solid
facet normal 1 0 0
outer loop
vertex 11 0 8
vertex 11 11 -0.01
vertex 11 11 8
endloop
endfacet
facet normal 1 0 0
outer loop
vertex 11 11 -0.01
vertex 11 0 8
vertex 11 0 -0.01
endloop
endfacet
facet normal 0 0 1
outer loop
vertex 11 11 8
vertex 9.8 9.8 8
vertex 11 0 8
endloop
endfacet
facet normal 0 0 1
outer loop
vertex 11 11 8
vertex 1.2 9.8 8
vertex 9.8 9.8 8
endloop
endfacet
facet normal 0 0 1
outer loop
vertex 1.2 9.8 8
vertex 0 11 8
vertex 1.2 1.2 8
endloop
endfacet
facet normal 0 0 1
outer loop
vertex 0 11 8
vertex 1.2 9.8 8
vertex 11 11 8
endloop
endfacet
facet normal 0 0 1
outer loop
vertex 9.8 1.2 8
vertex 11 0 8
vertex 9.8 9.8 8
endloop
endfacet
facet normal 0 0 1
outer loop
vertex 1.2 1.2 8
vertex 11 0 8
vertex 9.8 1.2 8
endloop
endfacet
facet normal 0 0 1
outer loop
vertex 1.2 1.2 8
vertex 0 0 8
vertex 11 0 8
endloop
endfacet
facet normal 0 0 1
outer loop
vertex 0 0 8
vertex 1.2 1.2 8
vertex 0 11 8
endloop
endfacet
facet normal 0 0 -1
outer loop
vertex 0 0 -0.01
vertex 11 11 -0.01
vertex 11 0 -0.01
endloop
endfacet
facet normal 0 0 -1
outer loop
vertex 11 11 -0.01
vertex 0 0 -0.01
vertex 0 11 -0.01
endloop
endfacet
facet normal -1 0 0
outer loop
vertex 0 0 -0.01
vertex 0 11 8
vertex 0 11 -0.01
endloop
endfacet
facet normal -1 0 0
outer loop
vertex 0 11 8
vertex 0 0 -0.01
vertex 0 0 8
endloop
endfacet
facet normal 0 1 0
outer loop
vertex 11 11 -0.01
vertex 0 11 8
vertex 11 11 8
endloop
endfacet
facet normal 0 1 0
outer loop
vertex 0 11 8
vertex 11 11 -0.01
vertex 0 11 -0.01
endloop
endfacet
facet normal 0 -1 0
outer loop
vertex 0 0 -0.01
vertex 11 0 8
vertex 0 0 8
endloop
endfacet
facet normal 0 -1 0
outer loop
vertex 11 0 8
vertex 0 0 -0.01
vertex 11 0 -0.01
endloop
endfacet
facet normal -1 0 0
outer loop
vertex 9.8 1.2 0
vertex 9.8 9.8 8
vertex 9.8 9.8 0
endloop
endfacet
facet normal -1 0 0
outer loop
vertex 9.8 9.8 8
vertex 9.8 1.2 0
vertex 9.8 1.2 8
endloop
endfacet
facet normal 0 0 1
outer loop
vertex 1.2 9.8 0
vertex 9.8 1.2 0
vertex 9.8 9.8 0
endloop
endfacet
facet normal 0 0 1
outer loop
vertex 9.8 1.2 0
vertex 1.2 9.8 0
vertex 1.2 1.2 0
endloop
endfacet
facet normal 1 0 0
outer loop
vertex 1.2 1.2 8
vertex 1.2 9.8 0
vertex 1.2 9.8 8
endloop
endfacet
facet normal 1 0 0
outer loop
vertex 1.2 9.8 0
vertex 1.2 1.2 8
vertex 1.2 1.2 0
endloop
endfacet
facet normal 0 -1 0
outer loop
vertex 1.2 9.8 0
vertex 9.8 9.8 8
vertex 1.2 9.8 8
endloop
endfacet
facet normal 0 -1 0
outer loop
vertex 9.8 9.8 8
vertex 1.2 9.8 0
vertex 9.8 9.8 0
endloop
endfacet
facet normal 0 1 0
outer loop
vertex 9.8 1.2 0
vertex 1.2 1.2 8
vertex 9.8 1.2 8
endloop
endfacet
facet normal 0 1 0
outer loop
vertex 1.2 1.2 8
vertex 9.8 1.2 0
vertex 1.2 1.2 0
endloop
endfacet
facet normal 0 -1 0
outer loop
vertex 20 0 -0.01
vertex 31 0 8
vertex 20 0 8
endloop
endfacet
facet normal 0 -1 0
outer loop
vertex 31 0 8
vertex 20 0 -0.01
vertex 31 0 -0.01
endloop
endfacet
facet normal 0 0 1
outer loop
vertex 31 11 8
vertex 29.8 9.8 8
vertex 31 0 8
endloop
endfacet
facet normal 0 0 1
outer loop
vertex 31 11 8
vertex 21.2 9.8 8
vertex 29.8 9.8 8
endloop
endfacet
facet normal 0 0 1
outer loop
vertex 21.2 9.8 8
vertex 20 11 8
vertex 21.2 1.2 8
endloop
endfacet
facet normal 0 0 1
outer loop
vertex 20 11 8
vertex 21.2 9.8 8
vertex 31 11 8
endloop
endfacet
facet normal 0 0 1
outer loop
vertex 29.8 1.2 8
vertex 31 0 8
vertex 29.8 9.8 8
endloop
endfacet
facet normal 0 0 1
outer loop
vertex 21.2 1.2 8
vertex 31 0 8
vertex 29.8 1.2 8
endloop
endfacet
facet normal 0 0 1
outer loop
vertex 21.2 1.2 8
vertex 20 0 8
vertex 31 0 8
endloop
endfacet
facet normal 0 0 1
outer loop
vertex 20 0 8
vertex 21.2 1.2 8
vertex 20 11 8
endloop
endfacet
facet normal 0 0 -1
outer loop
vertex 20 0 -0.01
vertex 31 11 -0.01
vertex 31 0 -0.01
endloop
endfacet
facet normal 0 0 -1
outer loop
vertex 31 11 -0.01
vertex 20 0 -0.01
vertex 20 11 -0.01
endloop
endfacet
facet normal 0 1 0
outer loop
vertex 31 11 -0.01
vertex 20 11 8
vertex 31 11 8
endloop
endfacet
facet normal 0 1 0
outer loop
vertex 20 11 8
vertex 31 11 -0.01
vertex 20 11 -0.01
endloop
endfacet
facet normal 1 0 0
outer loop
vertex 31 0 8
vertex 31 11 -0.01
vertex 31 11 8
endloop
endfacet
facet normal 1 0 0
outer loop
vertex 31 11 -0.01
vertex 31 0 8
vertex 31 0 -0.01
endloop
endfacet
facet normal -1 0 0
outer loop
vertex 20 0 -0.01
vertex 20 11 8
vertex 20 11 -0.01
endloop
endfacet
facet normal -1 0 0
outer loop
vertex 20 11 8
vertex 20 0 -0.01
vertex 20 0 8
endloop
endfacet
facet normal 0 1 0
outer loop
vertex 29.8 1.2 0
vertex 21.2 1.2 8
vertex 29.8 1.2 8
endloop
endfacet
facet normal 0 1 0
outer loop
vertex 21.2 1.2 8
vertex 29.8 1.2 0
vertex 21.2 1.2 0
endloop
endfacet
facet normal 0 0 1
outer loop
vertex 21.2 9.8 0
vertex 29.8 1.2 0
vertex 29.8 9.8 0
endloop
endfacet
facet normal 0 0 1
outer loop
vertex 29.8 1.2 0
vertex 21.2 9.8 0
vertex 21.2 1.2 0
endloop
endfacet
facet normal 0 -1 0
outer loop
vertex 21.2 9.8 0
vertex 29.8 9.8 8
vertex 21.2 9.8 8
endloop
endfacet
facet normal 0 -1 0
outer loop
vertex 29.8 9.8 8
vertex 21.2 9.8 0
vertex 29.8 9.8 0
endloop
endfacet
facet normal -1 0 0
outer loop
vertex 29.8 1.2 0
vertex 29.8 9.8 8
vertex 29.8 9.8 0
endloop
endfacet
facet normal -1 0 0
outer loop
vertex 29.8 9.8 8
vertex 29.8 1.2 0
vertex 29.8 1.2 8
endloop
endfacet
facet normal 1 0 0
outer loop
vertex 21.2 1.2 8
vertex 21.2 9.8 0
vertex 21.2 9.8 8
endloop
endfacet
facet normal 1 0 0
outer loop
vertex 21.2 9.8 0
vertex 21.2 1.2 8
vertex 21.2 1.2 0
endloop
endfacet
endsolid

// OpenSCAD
// file: ../../Base/Boxes.scad
// Fischertechnik Box Foundation
// Pre-designed Boxes

use <Constants.scad>

include <PlacementOptions.scad>

box190Width = 190;
box190Depth = 130;
box130Width = 130;
box130Depth = 95;
boxUsageHeight = 33.9;
boxWallThickness = 2.4;
boxBaseThickness = 1.0;

// getBoxWallThickness()
// Gets the wall thickness of a Fischertechnik Box

function getBoxWallThickness() = boxWallThickness;

// Gets the usable height of a fischertechnik box
function getBoxUsageHeight() = boxUsageHeight;

// Gets the thickness of the Fischertechnik box base.
function getBoxBaseThickness() = boxBaseThickness;

// Gets the usable inner space of a Box 190 as an x/y-list
function getBox190Space() = [
    box190Width - 2*getBoxWallThickness(), 
    box190Depth - 2*getBoxWallThickness() ];

// Imports the Fischertechnik empty box 130x190 mm and places it at position 0,0
// 190x130 are the outer sizes, the inner space is slightly smaller. Use getBox190Space() to get the inner sizes.
// This module needs the STL file "Fischertechnik Box 130x190.stl" in the library path.
// The box is positioned that the usable inner space is at the 0,0,0 position. The

module Box190() {
    translate([-getBoxWallThickness(),-getBoxWallThickness(),-getBoxBaseThickness()])
        import("Fischertechnik Box 130x190.stl", convexity=3);
}

// Gets the usable inner space of a Box 130 as an x/y-list
function getBox130Space() = [
    box130Width - 2*getBoxWallThickness(), 
    box130Depth - 2*getBoxWallThickness() ];

// Imports the Fischertechnik empty box 95x130 mm and places it at position 0,0
// 190x130 are the outer sizes, the inner space is slightly smaller. Use getBox190Space() to get the inner sizes.
// This module needs the STL file "Fischertechnik Box 95x130.stl" in the library path.
// The box is positioned that the usable inner space is at the 0,0,0 position. The

module Box130() {
    translate([-getBoxWallThickness(),-getBoxWallThickness(),-getBoxBaseThickness()])
        import("Fischertechnik Box 95x130.stl", convexity=3);
}

// Creates a web at the specified box walls
// corner 0 = LowerLeft, 1 = UpperLeft, 2 = UpperRight, 3 = LowerRight
// side 0 = LeftOfCorner, 1 = RightOfCorner
// distance = Distance in mm from the corner
// box = inner width and depth of the box (default: Box 190)
// webWidth = length of the web (default is 3 mms)
// webThickness = thickness of the web (default is 1 mm)

module BoxWeb(corner, side, distance, box=getBox190Space(), webWidth=3, webThickness=1.0) {
    sink = getBoxWallThickness()/2;

    width = (corner % 2 == 0) ? 
            (side == LeftOfCorner ? webWidth : webThickness) :
            (side == LeftOfCorner ? webThickness : webWidth);

    depth = (corner % 2 == 0) ? 
            (side == RightOfCorner ? webWidth : webThickness) :
            (side == RightOfCorner ? webThickness : webWidth);
    
    xDiff = corner == LowerLeft ? 
                (side == LeftOfCorner ? -sink : distance) :
            (corner == UpperLeft ?                
                (side == LeftOfCorner ? distance : -sink) :
            (corner == UpperRight ?
                (side == LeftOfCorner ? box.x-webWidth+sink : box.x-distance-webThickness) :
                (side == LeftOfCorner ? box.x-distance-webThickness: box.x-webWidth+sink)));

    yDiff = corner == LowerLeft ? 
                (side == RightOfCorner ? -sink : distance) :
            (corner == UpperLeft ?
                (side == RightOfCorner ? box.y-distance : box.y-webWidth+sink) :
            (corner == UpperRight ?
                (side == RightOfCorner ? box.y-webWidth+sink : box.y-distance) :
                (side == RightOfCorner ? distance : -sink)));
    
    translate([xDiff, yDiff, -getExcess()])
        cube([width, depth, boxUsageHeight + 2*getExcess()]);
}
// file: ../../Base/Rotation.scad
// Fischertechnik Box Foundation
// Geometry Helpers Rotation

include <PlacementOptions.scad>

// getRotatedSpace(space, rotation=NoRotation)
// Rotates the space dependent on the specified rotation

function getRotatedSpace(space, rotation=NoRotation) = [
    (rotation == Rotate90 || rotation == Rotate270) ? space.y : space.x,
    (rotation == Rotate90 || rotation == Rotate270) ? space.x : space.y
];

// Rotates the given space around the fixed left lower corner
// space = the space the children needs as width/depth list [width,depth]
// rotation = 0 Rotate0 degrees, 1 Rotate90 degrees, 2 Rotate180 degrees, 3 Rotate270 degrees (equivalent to -90)

module RotateFix(space, rotation=Rotate0) {
    dy = (rotation == Rotate0 || rotation == Rotate270) ? 0 :
        (rotation == Rotate90) ? space.x :
        space.y;
    dx = (rotation < Rotate180) ? 0 :
        (rotation == Rotate180) ? space.x :
        space.y;
    
    translate([dx, dy, 0])
        rotate([0, 0, rotations[rotation]])
            children();
}
// file: ../../Base/Alignment.scad
// Fischertechnik Box Foundation
// Geometry Helpers Alignment

include <PlacementOptions.scad>

// getAlignedX(elementWidth, spaceWidth, align=AlignRight, offset=0)
// Gets the aligned X offset of an element with the given
// width in the given space.
// elementWidth = The width of the element to positon
// spaceWidth = The space where the element should be aligned
// align = 0 AlignLeft, 1 AlignCenter, 2 AlignRight
// offset = an optional offset from the aligned position. When
// aligned left or centered, then positive values are in X direction.
// When aligned right then positive values are in negative X direction.

function getAlignedX(elementWidth, spaceWidth, align=AlignRight, offset=0) =
    (align == AlignLeft) ?
        offset :
        ((align == AlignCenter) ?
        (spaceWidth - elementWidth)/2 + offset :
        spaceWidth - offset - elementWidth);

// getAlignedY(elementDepth, spaceDepth, align=AlignTop, offset=0)
// Gets the aligned Y offset of an element with the given
// depth in the given space.
// elementDepth = The depth of the element to positon
// spaceDepth = The space where the element should be aligned
// align = 0 AlignBottom, 1 AlignCenter, 2 AlignTop
// offset = an optional offset from the aligned position. When
// aligned bottom or centered, then positive values are in Y direction.
// When aligned top then positive values are in negative Y direction.

function getAlignedY(elementDepth, spaceDepth, align=AlignTop, offset=0) =
    (align == AlignBottom) ?
        offset :
        ((align == AlignCenter) ?
        (spaceDepth - elementDepth)/2 + offset :
        spaceDepth - offset - elementDepth);
// file: ../../Base/Constants.scad
// Fischertechnik Box Foundation
// Constants

// Constant values necessary for multiple elements

// Base constants
dividerThickness = 1.2;
excess = 0.01;
fragments = 90;
tolerance = 0.8;

// Gets the thickness of a divider 
function getDividerThickness() = dividerThickness;

// Gets the excess that is used to merge walls into each other
function getExcess() = excess;

// Gets amount of fragments of a cylinder
function getFragments() = fragments;

// Gets the inner tolerance of a frame to each side
function getTolerance() = tolerance;


// Fischertechnik specific constants
axisDiameter = 4;
axisBottomDiameter = axisDiameter + 1;
standardEdgeDistance = 2.5;
standardWebDistance = 11.5;
standardCornerLength = 15;
tubeWallFactor = 1.6;

// Gets axis diameter
function getAxisDiameter() = axisDiameter;

// Gets axis bottom diameter for thicker part at the bottom
function getAxisBottomDiameter() = axisBottomDiameter;

// gets the standard distance to the wall of the box for dockable frames with webs
function getStandardEdgeDistance() = standardEdgeDistance;

// gets the standard distance of each web to the corner of the dockable frame
function getStandardWebDistance() = standardWebDistance;

// gets the standard length of the corner walls of a dockable frame
function getStandardCornerLength() = standardCornerLength;

// gets the wall thickness of a tube.
function getTubeWallThickness() = tubeWallFactor * getDividerThickness();
// file: ../../Base/PlacementOptions.scad
// Fischertechnik Box Foundation
// Placement Options

// Alignment
NoAlign = 0;
AlignLeft = 1;
AlignBottom = 2;
AlignCenter = 3;
AlignRight = 4;
AlignTop = 5;

// Element rotation degree steps
rotations = [0, -90, -180, -270];

// Rotation
NoRotation = 0;
Rotate0 = 0;
Rotate90 = 1;
Rotate180 = 2;
Rotate270 = 3;

// Docking (seen from above)
NoDock = -1;
DockLeft = 0;
DockTop = 1;
DockRight = 2;
DockCorner = 2;
DockBottom = 3;

// Web corners
LowerLeft = 0;
UpperLeft = 1;
UpperRight = 2;
LowerRight = 3;

// Web position relative to corner
LeftOfCorner = 0;
RightOfCorner = 1;
// file: ../../Elements/FrameShortHook.scad
// Fischertechnik Box Library
// Frame for Short Hook
// 38225

use <../ModelBase/Simple.scad>

width = 7.8;
depth = 7.8;
height = 8;

// getFrameShortHookSpace()
// Gets the space of a frame for a short hook

function getFrameShortHookSpace() = getFrameOuterVolume([width, depth, height]);

// FrameShortHook()
// Frame for short hook.

module FrameShortHook() {
    Frame([width, depth, height]);
}

// Tests
color("lightgray")
FrameShortHook();
// file: ../../Base/Placement.scad
// Fischertechnik Box Foundation
// Geometry Helpers Placement

use <Constants.scad>
use <Alignment.scad>
use <Rotation.scad>
use <Boxes.scad>

include <PlacementOptions.scad>

// Place(x=0, y=0, elementSpace=[0,0], alignX=AlignLeft, alignY=AlignBottom, rotation=Rotate0, boxSpace=getBox190Space())
// Places the child at the specified position
// y = Y-Position. This is a relative position when an X aligment is specified.
// x = X-Position. This is a relative position when an Y aligment is specified.
// elementSpace = space of the element to be placed [x,y]
// alignX = -1=NoAlign, 0 AlignLeft, 1 AlignCenter, 3 AlignRight (elementSpace and boxSpace required!)
// alignY = -1=NoAlign, 2 AlignBottom, 1 AlignCenter, 4 AlignTop (elementSpace and boxSpace required!)
// rotation = 0 Rotate0 0 degrees, 1 Rotate90 90 degrees, 
// 2 Rotate180 180 degrees, 3 Rotate270 270 degrees (equivalent to -90)
// boxSpace = Inner space of the box where the placement occurs [x,y] - default is Box 190x130 inner space

module Place(x=0, y=0, elementSpace=[0,0], 
  alignX=AlignLeft, alignY=AlignBottom, 
  rotation=NoRotation, boxSpace=getBox190Space()) {

    module Position(x, y, space, rotation=Rotate0) {
        translate([x, y, 0])
            RotateFix(space, rotation)
                children(0);
    }

    space = getRotatedSpace(elementSpace, rotation);
    alignedX = getAlignedX(space.x, boxSpace.x, alignX, x);
    alignedY = getAlignedY(space.y, boxSpace.y, alignY, y);
    Position(alignedX, alignedY, elementSpace, rotation)
        children(0);
}

// Center(space=getBox130Space(), elementSpace=[0,0])
// space = Space where the children is centered. For cylinder use centered=true and no elementSpace.
// elementSpace = space of the element to be centered [x,y]

module Center(space=getBox190Space(), elementSpace=[0,0]) {
    translate([(space.x - elementSpace.x) / 2, (space.y - elementSpace.y) / 2])
        children(0);
}

// CenterHorizontal(width=0, y=0, offset=0, space=getBox130Space())
// space = Space where the children is centered. For cylinder use centered=true and no elementSpace.
// elementSpace = space of the element to be centered [x,y]

module CenterHorizontal(width=0, y=0, offset=0, space=getBox190Space()) {
    translate([(space.x - width) / 2 + offset, y])
        children(0);
}

// CenterVertical(depth=0, x=0, offset=0, space=getBox130Space())
// space = Space where the children is centered. For cylinder use centered=true and no elementSpace.
// elementSpace = space of the element to be centered [x,y]

module CenterVerticalal(depth=0, x=0, offset=0, space=getBox190Space()) {
    translate([x, (space.y - depth) / 2 + offset])
        children(0);
}
// main file
// Fischertechnik Box Foundation
// Elements
// Test FrameShortHook

use <../../Base/Placement.scad>
use <../../Elements/FrameShortHook.scad>

include <../../Base/PlacementOptions.scad>

FrameShortHook();

Place(20, 0, getFrameShortHookSpace(), rotation=Rotate90)
    FrameShortHook();
